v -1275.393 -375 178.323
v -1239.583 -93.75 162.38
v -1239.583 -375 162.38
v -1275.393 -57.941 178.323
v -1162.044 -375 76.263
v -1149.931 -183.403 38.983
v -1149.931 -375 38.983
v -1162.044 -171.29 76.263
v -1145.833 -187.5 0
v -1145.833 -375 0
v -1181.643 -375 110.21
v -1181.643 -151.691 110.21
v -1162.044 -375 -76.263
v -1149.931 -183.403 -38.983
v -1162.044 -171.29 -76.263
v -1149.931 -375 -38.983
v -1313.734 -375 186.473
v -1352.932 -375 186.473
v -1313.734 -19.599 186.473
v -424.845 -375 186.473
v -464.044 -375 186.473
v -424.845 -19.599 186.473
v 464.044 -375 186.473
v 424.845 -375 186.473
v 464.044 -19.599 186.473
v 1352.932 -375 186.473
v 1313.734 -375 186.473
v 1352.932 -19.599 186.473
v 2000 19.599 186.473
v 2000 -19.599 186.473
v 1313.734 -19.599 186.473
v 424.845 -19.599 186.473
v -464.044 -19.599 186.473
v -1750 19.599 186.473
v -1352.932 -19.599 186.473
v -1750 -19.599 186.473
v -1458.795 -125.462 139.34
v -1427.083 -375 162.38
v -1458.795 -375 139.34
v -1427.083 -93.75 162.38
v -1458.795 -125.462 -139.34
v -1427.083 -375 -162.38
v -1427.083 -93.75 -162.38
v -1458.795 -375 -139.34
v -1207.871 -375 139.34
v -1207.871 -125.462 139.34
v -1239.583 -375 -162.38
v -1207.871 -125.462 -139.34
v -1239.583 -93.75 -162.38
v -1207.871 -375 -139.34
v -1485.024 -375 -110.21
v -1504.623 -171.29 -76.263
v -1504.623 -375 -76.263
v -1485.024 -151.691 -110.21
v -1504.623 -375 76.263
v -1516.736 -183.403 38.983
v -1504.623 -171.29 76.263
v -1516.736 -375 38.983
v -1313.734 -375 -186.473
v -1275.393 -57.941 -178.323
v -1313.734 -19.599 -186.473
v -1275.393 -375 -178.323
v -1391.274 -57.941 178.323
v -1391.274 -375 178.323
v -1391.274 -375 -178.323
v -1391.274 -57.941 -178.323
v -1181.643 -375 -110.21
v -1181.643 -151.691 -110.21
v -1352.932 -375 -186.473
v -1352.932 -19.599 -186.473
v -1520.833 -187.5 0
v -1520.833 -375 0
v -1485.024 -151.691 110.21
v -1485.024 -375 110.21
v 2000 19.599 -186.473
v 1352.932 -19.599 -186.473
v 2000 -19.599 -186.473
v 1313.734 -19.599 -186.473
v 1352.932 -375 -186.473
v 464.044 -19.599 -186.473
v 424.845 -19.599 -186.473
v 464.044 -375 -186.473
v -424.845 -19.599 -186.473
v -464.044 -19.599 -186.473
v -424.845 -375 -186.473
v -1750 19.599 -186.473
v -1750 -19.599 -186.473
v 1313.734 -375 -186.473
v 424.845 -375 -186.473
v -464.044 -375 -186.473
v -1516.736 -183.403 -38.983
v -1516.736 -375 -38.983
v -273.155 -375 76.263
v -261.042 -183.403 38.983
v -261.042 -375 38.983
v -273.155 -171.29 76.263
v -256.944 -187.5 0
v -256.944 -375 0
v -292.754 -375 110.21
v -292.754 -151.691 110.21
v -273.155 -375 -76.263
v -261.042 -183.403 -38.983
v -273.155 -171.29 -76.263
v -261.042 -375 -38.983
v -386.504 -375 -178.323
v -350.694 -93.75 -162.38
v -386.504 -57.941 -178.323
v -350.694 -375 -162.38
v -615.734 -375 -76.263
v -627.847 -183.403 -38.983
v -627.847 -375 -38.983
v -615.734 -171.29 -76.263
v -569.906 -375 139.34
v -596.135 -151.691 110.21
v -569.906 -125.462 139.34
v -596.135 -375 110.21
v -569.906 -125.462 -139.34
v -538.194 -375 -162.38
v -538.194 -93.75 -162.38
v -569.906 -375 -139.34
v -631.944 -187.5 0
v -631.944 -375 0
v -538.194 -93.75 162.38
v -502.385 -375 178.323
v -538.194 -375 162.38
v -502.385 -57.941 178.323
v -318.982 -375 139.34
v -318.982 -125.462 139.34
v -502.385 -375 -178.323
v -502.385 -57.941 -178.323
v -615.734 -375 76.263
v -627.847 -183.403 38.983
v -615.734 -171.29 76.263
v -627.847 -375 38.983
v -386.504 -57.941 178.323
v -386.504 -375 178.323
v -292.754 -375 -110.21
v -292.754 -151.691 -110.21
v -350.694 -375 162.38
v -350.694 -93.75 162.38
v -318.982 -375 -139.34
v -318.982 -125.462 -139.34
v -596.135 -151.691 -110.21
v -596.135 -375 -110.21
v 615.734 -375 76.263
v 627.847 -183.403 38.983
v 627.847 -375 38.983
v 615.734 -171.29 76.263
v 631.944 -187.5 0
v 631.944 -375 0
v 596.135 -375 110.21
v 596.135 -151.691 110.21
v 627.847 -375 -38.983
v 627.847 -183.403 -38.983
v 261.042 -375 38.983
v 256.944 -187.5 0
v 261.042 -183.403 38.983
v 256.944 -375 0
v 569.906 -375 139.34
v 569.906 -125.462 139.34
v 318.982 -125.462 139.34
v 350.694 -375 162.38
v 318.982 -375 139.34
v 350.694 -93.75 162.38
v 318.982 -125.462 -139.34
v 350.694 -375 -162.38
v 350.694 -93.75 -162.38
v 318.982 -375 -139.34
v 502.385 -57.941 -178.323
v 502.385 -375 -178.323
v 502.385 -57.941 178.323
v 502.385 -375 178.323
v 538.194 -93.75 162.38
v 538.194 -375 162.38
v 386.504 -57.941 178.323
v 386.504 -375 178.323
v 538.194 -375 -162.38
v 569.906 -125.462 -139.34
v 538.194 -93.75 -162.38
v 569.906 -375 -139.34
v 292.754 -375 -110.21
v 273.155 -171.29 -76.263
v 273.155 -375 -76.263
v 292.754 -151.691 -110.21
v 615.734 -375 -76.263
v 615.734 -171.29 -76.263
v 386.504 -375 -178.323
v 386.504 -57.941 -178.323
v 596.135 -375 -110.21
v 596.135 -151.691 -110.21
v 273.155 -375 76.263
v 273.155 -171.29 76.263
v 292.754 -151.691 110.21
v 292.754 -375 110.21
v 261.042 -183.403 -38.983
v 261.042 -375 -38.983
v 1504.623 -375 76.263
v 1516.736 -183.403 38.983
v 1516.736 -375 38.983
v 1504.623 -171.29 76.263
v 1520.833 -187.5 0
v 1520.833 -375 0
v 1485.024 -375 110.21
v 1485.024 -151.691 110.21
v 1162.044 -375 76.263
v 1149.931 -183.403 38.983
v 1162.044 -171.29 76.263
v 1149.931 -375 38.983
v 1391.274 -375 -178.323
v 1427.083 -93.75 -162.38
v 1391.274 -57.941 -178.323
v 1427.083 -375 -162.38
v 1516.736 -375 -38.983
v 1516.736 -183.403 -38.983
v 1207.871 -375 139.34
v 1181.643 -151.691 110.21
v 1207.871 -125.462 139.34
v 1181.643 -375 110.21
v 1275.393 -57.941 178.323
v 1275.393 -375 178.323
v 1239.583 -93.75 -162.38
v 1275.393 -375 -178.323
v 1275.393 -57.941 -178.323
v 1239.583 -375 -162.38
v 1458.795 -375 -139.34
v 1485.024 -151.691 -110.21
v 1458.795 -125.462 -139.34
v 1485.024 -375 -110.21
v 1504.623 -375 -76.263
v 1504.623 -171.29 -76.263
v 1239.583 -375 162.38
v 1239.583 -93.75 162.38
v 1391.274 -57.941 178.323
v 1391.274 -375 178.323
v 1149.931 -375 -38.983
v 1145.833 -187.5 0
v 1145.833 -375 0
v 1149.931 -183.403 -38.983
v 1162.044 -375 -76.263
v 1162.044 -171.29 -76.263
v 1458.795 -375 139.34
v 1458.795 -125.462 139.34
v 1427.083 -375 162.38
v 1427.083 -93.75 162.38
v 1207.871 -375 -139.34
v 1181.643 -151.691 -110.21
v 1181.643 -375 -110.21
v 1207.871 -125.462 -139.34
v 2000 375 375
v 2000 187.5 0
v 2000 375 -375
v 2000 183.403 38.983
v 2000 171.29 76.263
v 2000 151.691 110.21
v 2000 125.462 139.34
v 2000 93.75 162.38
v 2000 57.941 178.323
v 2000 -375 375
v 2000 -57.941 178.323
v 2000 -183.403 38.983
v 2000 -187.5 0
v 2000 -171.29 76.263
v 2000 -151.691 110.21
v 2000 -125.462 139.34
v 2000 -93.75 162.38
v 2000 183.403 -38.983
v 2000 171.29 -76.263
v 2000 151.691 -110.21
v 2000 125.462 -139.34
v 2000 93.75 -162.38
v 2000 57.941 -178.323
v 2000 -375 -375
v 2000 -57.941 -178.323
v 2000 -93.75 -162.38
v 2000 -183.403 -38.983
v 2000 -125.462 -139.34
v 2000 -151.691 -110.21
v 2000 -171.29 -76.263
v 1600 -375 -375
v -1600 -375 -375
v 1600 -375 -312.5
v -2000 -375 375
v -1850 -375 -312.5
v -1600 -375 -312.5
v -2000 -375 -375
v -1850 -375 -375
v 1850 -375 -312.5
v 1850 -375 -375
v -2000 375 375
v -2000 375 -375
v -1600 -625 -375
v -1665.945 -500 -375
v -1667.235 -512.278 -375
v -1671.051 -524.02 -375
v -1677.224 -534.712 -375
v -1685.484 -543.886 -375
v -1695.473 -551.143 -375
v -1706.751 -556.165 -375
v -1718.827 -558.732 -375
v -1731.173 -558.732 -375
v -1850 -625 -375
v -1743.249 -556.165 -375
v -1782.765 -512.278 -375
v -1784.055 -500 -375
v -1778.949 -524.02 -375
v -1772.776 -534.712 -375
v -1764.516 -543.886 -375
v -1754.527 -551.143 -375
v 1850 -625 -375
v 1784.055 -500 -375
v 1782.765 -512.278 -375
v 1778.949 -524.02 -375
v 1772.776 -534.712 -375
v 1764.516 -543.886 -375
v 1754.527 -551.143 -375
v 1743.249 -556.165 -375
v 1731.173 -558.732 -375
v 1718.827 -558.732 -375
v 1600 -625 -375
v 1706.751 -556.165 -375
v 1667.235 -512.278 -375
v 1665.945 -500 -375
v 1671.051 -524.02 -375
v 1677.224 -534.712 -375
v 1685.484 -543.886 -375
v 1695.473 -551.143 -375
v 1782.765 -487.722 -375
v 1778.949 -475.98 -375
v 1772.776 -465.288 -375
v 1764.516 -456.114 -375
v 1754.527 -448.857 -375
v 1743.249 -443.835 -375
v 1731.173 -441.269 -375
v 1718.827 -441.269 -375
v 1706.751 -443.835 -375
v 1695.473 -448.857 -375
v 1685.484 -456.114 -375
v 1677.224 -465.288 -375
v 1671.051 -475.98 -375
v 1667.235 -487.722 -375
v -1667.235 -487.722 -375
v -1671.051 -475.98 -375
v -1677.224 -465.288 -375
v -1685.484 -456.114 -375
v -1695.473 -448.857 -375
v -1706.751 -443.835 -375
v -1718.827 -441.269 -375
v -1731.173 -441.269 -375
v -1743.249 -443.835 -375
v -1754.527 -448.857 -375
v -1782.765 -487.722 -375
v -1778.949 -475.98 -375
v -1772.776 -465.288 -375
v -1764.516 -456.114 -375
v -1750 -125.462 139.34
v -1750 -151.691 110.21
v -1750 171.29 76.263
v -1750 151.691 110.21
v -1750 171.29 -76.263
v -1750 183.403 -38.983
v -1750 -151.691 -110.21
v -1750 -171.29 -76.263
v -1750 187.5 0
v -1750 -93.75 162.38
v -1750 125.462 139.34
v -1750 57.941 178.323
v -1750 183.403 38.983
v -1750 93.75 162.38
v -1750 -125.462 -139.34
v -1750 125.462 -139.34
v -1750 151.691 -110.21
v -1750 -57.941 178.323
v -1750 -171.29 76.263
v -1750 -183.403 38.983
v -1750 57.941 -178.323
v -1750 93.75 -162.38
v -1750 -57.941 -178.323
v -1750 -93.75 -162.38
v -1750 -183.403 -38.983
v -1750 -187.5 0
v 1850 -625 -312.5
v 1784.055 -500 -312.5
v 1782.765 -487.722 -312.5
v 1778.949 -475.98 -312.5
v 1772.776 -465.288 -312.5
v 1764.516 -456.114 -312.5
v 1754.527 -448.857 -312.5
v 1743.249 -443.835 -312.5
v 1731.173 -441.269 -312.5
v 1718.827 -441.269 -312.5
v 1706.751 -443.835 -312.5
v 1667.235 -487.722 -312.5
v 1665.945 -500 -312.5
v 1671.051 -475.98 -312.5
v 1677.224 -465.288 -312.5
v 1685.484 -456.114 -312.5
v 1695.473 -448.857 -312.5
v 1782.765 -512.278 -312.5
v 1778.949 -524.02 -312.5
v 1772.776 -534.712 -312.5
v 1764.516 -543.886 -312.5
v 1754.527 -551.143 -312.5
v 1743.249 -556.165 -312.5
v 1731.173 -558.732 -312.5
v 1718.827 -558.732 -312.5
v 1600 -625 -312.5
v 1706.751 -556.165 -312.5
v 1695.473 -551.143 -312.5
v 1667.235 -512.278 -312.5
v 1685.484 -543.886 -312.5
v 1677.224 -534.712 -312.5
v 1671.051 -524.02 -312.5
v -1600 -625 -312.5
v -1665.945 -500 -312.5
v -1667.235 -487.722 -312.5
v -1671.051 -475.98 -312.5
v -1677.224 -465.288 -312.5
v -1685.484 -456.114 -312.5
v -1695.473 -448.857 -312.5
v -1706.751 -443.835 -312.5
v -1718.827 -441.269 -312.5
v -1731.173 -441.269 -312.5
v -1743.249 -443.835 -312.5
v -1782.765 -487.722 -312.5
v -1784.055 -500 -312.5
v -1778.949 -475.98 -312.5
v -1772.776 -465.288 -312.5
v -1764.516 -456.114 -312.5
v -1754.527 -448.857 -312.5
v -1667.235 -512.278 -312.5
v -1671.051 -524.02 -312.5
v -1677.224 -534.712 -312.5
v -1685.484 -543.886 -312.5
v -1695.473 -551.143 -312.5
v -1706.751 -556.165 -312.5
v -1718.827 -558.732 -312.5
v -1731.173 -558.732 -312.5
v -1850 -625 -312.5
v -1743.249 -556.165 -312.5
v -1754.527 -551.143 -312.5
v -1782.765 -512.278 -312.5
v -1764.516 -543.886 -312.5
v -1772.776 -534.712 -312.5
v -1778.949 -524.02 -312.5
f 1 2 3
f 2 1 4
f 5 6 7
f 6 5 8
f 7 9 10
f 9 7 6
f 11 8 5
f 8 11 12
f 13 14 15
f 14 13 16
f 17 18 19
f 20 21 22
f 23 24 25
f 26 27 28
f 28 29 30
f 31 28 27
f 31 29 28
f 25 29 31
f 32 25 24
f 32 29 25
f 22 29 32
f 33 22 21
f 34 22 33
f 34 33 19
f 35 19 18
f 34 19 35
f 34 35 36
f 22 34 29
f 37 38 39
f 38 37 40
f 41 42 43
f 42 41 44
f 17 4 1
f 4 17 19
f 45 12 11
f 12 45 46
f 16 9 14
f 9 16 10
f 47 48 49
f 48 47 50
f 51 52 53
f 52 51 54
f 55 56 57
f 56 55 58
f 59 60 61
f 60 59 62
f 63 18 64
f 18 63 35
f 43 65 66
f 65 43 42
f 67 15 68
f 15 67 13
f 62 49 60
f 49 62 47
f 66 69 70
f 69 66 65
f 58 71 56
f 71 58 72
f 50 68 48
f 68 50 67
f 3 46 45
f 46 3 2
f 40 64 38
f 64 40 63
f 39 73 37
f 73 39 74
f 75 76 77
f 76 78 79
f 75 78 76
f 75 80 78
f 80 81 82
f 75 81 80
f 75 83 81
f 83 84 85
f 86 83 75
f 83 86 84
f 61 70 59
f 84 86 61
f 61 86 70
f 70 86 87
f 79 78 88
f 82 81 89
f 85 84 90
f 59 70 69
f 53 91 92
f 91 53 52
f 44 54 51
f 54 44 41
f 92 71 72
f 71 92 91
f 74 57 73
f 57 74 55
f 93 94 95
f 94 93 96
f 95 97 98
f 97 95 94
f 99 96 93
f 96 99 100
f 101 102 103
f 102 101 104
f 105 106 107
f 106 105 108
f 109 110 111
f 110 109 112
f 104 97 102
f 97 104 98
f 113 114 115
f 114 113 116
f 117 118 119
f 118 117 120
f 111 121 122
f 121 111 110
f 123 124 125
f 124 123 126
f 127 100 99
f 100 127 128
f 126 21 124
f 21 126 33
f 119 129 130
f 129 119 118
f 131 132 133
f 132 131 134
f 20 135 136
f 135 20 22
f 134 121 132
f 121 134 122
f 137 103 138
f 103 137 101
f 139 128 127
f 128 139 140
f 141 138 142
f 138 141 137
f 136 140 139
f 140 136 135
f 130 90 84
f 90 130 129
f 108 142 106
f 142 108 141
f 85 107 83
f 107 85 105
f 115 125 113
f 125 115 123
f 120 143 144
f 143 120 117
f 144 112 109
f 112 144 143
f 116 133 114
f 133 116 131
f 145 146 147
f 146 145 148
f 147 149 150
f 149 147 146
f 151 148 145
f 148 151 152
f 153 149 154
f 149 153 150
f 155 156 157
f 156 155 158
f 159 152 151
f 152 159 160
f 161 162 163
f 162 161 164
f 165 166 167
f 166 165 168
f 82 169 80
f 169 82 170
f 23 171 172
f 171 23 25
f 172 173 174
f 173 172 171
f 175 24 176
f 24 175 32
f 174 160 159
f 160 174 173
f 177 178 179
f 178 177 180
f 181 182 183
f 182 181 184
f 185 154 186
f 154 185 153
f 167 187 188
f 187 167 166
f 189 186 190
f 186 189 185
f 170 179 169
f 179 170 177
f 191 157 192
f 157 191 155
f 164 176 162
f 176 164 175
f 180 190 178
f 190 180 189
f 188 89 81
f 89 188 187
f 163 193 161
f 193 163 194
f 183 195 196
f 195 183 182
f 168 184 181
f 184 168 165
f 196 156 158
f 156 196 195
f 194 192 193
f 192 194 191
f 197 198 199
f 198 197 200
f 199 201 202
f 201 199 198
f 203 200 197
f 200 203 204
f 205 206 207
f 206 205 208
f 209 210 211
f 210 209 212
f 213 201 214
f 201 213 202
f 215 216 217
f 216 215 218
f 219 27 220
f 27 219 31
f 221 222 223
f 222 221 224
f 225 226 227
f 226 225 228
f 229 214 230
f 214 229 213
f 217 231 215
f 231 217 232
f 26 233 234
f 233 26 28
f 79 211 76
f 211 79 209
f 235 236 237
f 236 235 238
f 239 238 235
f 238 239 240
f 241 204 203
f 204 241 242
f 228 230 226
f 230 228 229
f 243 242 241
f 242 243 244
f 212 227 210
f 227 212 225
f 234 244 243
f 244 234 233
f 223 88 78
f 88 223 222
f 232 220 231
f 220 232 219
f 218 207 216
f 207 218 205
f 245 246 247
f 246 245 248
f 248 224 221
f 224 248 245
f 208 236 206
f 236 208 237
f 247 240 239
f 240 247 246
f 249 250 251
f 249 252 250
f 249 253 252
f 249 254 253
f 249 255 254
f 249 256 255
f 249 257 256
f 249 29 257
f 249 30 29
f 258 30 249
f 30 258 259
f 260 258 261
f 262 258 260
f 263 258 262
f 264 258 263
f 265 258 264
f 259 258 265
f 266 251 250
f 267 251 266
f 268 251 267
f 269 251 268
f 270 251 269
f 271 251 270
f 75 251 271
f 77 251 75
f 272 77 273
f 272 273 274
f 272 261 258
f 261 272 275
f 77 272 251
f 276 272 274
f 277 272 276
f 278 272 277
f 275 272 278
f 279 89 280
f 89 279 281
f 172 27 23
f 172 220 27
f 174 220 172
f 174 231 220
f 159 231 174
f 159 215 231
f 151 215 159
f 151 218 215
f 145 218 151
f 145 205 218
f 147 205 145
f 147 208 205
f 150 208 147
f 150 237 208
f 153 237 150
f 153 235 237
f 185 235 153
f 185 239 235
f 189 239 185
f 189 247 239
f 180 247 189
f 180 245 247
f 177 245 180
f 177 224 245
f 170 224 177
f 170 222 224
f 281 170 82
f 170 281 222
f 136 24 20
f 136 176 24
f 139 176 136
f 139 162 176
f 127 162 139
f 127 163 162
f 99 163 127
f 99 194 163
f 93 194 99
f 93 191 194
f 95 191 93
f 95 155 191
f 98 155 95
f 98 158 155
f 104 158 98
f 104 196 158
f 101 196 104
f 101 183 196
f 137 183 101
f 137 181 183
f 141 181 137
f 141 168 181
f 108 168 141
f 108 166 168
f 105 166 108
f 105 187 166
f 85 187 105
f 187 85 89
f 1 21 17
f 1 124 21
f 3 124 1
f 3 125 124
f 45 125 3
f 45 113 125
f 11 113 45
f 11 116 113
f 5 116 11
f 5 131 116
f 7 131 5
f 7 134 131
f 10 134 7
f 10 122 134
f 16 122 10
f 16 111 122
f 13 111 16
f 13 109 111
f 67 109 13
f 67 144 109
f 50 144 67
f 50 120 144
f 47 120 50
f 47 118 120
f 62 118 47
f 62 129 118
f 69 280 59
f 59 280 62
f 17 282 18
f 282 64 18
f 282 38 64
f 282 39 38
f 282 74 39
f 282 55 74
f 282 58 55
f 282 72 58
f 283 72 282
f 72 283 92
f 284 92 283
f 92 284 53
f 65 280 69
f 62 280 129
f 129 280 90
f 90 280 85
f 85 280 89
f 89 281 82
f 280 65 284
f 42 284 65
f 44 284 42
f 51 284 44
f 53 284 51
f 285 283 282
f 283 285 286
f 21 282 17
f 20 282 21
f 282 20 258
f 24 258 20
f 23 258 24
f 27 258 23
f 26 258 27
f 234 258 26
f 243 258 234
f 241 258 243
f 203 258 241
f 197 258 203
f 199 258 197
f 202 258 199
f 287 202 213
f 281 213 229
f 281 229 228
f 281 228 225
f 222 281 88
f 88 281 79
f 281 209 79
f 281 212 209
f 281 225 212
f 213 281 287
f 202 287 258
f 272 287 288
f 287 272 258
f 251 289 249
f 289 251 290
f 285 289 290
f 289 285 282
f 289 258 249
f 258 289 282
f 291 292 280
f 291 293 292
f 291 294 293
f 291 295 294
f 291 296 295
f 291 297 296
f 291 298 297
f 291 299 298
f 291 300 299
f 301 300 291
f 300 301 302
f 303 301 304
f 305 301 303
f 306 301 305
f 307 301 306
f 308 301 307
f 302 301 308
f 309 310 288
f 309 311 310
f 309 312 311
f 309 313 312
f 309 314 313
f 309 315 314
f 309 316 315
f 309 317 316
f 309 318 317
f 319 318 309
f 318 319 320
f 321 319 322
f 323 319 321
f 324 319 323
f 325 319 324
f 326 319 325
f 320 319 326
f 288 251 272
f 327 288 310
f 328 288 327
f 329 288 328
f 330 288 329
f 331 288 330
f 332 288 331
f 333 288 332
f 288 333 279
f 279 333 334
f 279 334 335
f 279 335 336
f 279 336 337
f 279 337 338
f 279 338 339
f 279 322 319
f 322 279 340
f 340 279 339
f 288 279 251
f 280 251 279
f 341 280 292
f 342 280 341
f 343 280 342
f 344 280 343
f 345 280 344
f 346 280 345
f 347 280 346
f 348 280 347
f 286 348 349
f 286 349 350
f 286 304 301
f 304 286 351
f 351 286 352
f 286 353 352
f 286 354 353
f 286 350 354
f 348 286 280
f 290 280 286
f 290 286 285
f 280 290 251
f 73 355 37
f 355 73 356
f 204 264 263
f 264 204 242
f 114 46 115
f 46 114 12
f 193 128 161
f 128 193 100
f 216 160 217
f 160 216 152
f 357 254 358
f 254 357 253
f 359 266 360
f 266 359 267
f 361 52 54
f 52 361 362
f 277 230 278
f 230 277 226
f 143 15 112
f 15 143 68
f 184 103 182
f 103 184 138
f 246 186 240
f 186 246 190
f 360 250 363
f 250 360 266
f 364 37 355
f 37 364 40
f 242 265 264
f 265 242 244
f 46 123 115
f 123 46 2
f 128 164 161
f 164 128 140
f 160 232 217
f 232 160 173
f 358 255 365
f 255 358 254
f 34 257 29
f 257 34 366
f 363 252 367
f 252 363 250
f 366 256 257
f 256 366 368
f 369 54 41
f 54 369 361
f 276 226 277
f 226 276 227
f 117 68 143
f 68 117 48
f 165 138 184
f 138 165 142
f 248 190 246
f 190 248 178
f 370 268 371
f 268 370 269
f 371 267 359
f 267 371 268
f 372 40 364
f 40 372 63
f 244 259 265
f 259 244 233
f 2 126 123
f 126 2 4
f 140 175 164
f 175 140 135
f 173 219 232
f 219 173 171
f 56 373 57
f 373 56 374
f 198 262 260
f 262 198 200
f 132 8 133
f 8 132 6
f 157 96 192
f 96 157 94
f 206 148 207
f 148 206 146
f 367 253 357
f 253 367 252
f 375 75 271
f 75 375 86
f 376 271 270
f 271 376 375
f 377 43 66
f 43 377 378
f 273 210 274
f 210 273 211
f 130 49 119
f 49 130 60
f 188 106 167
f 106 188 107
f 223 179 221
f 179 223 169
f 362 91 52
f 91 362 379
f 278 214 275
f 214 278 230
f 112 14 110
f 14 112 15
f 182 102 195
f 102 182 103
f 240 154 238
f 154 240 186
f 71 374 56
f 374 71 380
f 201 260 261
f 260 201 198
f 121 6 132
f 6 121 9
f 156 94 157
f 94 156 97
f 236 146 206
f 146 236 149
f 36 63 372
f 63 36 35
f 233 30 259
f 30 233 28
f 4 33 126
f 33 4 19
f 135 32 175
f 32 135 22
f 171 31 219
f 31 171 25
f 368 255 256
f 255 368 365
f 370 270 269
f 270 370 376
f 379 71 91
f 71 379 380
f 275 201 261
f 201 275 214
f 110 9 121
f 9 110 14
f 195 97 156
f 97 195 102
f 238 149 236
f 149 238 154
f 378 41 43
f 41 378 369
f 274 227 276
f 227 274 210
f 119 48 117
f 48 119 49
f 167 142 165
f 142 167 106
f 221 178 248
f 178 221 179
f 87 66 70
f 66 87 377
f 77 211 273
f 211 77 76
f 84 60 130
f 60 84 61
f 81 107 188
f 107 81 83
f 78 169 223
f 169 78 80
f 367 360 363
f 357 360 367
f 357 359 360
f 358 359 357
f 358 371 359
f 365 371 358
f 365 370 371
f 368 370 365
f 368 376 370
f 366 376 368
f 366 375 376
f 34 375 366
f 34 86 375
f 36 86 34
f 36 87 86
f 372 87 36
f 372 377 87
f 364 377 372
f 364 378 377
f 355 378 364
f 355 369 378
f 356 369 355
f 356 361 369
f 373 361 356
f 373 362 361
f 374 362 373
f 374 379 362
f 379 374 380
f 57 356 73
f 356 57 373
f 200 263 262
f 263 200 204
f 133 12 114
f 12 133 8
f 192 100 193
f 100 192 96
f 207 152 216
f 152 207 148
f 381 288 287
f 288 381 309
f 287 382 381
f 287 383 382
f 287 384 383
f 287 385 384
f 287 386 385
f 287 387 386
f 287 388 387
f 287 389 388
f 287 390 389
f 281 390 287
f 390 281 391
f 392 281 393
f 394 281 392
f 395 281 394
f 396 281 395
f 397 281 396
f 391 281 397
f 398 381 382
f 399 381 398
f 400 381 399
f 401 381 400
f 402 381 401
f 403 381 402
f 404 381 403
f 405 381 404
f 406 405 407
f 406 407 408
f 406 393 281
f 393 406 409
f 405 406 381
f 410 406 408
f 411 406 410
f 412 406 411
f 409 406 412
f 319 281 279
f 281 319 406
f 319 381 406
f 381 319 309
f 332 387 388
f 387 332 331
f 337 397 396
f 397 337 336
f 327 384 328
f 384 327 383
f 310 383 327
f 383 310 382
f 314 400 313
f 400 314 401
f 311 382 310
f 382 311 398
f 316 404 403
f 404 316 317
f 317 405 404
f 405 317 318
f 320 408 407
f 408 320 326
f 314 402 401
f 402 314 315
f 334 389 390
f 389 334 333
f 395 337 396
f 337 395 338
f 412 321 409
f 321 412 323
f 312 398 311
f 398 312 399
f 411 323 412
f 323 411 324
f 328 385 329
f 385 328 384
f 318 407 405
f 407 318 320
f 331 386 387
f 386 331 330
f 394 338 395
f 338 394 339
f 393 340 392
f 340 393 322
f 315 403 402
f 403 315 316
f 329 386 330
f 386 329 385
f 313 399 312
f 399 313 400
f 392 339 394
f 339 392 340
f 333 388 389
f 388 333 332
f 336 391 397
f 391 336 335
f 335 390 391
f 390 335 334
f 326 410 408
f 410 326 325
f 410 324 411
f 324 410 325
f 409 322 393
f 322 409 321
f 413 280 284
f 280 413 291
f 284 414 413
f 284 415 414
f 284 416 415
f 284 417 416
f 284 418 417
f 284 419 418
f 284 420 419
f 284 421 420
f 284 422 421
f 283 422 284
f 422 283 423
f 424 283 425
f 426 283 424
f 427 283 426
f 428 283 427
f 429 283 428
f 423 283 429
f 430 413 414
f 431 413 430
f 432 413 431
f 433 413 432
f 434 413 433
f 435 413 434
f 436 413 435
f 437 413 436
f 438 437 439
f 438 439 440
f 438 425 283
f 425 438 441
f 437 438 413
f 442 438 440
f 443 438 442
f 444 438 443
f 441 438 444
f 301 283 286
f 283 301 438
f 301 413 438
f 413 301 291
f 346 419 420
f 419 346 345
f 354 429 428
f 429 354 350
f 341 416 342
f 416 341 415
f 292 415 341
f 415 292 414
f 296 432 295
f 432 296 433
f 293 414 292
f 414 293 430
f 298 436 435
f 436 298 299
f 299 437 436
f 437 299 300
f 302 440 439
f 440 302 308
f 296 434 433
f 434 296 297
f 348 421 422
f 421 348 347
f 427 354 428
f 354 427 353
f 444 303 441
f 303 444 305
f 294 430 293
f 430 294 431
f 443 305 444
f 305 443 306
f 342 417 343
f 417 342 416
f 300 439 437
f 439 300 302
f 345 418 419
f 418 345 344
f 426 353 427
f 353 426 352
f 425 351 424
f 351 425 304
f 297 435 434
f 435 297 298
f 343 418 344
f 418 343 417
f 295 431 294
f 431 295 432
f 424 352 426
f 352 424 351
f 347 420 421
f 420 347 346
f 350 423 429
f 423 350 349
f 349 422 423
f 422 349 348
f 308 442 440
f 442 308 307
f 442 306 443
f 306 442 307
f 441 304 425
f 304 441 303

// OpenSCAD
inch = 1000;
mm = 39.37;
L = 4 * inch;
W = .75 * inch;
H = .75 * inch;
R = (3./16)*inch;
start = -L/3.;
stop = L/3.;
step = (stop - start) / 3;

module manifold(){
  difference(){
    union(){
      translate([-L/2, -W/2, -H/2])
	cube([L, W, H]);
    }
    translate([-L/2 + .25*inch, 0, 0])
      rotate(90, [0, 1, 0])
      cylinder(h=L, r=R);
    for(x=[start:step:stop]){
      translate([x, 0, 0])
	cylinder(h=.5*inch, r=R);
    }
  }
}

module tab2(){
  difference(){
    cube([1/4 * inch, 1.25 * inch, 1/16 * inch]);
    translate([1/8 * inch, .125*inch, 0])
    cylinder(h=.333*inch, r = 1.5*mm);
    translate([1/8 * inch, 1.125*inch, 0])
    cylinder(h=.333*inch, r = 1.5*mm);
  }
}

module tab1(){
  difference(){
    cube([1/4 * inch, 1.25/2 * inch, 1/16 * inch]);
    translate([1/8 * inch, .125*inch, 0])
    cylinder(h=.333*inch, r = 1.5*mm);
  }
}

rotate(90, [1, 0, 0])
union(){
  manifold();
  rotate(-90, [1, 0, 0])
  translate([L/2.5, -1.25/2*inch, -.75/2*inch])
    tab1();

  rotate(-90, [1, 0, 0])
  translate([-L/2.5 - .25*inch, -1.25/2*inch, -.75/2*inch])
    tab1();

}
